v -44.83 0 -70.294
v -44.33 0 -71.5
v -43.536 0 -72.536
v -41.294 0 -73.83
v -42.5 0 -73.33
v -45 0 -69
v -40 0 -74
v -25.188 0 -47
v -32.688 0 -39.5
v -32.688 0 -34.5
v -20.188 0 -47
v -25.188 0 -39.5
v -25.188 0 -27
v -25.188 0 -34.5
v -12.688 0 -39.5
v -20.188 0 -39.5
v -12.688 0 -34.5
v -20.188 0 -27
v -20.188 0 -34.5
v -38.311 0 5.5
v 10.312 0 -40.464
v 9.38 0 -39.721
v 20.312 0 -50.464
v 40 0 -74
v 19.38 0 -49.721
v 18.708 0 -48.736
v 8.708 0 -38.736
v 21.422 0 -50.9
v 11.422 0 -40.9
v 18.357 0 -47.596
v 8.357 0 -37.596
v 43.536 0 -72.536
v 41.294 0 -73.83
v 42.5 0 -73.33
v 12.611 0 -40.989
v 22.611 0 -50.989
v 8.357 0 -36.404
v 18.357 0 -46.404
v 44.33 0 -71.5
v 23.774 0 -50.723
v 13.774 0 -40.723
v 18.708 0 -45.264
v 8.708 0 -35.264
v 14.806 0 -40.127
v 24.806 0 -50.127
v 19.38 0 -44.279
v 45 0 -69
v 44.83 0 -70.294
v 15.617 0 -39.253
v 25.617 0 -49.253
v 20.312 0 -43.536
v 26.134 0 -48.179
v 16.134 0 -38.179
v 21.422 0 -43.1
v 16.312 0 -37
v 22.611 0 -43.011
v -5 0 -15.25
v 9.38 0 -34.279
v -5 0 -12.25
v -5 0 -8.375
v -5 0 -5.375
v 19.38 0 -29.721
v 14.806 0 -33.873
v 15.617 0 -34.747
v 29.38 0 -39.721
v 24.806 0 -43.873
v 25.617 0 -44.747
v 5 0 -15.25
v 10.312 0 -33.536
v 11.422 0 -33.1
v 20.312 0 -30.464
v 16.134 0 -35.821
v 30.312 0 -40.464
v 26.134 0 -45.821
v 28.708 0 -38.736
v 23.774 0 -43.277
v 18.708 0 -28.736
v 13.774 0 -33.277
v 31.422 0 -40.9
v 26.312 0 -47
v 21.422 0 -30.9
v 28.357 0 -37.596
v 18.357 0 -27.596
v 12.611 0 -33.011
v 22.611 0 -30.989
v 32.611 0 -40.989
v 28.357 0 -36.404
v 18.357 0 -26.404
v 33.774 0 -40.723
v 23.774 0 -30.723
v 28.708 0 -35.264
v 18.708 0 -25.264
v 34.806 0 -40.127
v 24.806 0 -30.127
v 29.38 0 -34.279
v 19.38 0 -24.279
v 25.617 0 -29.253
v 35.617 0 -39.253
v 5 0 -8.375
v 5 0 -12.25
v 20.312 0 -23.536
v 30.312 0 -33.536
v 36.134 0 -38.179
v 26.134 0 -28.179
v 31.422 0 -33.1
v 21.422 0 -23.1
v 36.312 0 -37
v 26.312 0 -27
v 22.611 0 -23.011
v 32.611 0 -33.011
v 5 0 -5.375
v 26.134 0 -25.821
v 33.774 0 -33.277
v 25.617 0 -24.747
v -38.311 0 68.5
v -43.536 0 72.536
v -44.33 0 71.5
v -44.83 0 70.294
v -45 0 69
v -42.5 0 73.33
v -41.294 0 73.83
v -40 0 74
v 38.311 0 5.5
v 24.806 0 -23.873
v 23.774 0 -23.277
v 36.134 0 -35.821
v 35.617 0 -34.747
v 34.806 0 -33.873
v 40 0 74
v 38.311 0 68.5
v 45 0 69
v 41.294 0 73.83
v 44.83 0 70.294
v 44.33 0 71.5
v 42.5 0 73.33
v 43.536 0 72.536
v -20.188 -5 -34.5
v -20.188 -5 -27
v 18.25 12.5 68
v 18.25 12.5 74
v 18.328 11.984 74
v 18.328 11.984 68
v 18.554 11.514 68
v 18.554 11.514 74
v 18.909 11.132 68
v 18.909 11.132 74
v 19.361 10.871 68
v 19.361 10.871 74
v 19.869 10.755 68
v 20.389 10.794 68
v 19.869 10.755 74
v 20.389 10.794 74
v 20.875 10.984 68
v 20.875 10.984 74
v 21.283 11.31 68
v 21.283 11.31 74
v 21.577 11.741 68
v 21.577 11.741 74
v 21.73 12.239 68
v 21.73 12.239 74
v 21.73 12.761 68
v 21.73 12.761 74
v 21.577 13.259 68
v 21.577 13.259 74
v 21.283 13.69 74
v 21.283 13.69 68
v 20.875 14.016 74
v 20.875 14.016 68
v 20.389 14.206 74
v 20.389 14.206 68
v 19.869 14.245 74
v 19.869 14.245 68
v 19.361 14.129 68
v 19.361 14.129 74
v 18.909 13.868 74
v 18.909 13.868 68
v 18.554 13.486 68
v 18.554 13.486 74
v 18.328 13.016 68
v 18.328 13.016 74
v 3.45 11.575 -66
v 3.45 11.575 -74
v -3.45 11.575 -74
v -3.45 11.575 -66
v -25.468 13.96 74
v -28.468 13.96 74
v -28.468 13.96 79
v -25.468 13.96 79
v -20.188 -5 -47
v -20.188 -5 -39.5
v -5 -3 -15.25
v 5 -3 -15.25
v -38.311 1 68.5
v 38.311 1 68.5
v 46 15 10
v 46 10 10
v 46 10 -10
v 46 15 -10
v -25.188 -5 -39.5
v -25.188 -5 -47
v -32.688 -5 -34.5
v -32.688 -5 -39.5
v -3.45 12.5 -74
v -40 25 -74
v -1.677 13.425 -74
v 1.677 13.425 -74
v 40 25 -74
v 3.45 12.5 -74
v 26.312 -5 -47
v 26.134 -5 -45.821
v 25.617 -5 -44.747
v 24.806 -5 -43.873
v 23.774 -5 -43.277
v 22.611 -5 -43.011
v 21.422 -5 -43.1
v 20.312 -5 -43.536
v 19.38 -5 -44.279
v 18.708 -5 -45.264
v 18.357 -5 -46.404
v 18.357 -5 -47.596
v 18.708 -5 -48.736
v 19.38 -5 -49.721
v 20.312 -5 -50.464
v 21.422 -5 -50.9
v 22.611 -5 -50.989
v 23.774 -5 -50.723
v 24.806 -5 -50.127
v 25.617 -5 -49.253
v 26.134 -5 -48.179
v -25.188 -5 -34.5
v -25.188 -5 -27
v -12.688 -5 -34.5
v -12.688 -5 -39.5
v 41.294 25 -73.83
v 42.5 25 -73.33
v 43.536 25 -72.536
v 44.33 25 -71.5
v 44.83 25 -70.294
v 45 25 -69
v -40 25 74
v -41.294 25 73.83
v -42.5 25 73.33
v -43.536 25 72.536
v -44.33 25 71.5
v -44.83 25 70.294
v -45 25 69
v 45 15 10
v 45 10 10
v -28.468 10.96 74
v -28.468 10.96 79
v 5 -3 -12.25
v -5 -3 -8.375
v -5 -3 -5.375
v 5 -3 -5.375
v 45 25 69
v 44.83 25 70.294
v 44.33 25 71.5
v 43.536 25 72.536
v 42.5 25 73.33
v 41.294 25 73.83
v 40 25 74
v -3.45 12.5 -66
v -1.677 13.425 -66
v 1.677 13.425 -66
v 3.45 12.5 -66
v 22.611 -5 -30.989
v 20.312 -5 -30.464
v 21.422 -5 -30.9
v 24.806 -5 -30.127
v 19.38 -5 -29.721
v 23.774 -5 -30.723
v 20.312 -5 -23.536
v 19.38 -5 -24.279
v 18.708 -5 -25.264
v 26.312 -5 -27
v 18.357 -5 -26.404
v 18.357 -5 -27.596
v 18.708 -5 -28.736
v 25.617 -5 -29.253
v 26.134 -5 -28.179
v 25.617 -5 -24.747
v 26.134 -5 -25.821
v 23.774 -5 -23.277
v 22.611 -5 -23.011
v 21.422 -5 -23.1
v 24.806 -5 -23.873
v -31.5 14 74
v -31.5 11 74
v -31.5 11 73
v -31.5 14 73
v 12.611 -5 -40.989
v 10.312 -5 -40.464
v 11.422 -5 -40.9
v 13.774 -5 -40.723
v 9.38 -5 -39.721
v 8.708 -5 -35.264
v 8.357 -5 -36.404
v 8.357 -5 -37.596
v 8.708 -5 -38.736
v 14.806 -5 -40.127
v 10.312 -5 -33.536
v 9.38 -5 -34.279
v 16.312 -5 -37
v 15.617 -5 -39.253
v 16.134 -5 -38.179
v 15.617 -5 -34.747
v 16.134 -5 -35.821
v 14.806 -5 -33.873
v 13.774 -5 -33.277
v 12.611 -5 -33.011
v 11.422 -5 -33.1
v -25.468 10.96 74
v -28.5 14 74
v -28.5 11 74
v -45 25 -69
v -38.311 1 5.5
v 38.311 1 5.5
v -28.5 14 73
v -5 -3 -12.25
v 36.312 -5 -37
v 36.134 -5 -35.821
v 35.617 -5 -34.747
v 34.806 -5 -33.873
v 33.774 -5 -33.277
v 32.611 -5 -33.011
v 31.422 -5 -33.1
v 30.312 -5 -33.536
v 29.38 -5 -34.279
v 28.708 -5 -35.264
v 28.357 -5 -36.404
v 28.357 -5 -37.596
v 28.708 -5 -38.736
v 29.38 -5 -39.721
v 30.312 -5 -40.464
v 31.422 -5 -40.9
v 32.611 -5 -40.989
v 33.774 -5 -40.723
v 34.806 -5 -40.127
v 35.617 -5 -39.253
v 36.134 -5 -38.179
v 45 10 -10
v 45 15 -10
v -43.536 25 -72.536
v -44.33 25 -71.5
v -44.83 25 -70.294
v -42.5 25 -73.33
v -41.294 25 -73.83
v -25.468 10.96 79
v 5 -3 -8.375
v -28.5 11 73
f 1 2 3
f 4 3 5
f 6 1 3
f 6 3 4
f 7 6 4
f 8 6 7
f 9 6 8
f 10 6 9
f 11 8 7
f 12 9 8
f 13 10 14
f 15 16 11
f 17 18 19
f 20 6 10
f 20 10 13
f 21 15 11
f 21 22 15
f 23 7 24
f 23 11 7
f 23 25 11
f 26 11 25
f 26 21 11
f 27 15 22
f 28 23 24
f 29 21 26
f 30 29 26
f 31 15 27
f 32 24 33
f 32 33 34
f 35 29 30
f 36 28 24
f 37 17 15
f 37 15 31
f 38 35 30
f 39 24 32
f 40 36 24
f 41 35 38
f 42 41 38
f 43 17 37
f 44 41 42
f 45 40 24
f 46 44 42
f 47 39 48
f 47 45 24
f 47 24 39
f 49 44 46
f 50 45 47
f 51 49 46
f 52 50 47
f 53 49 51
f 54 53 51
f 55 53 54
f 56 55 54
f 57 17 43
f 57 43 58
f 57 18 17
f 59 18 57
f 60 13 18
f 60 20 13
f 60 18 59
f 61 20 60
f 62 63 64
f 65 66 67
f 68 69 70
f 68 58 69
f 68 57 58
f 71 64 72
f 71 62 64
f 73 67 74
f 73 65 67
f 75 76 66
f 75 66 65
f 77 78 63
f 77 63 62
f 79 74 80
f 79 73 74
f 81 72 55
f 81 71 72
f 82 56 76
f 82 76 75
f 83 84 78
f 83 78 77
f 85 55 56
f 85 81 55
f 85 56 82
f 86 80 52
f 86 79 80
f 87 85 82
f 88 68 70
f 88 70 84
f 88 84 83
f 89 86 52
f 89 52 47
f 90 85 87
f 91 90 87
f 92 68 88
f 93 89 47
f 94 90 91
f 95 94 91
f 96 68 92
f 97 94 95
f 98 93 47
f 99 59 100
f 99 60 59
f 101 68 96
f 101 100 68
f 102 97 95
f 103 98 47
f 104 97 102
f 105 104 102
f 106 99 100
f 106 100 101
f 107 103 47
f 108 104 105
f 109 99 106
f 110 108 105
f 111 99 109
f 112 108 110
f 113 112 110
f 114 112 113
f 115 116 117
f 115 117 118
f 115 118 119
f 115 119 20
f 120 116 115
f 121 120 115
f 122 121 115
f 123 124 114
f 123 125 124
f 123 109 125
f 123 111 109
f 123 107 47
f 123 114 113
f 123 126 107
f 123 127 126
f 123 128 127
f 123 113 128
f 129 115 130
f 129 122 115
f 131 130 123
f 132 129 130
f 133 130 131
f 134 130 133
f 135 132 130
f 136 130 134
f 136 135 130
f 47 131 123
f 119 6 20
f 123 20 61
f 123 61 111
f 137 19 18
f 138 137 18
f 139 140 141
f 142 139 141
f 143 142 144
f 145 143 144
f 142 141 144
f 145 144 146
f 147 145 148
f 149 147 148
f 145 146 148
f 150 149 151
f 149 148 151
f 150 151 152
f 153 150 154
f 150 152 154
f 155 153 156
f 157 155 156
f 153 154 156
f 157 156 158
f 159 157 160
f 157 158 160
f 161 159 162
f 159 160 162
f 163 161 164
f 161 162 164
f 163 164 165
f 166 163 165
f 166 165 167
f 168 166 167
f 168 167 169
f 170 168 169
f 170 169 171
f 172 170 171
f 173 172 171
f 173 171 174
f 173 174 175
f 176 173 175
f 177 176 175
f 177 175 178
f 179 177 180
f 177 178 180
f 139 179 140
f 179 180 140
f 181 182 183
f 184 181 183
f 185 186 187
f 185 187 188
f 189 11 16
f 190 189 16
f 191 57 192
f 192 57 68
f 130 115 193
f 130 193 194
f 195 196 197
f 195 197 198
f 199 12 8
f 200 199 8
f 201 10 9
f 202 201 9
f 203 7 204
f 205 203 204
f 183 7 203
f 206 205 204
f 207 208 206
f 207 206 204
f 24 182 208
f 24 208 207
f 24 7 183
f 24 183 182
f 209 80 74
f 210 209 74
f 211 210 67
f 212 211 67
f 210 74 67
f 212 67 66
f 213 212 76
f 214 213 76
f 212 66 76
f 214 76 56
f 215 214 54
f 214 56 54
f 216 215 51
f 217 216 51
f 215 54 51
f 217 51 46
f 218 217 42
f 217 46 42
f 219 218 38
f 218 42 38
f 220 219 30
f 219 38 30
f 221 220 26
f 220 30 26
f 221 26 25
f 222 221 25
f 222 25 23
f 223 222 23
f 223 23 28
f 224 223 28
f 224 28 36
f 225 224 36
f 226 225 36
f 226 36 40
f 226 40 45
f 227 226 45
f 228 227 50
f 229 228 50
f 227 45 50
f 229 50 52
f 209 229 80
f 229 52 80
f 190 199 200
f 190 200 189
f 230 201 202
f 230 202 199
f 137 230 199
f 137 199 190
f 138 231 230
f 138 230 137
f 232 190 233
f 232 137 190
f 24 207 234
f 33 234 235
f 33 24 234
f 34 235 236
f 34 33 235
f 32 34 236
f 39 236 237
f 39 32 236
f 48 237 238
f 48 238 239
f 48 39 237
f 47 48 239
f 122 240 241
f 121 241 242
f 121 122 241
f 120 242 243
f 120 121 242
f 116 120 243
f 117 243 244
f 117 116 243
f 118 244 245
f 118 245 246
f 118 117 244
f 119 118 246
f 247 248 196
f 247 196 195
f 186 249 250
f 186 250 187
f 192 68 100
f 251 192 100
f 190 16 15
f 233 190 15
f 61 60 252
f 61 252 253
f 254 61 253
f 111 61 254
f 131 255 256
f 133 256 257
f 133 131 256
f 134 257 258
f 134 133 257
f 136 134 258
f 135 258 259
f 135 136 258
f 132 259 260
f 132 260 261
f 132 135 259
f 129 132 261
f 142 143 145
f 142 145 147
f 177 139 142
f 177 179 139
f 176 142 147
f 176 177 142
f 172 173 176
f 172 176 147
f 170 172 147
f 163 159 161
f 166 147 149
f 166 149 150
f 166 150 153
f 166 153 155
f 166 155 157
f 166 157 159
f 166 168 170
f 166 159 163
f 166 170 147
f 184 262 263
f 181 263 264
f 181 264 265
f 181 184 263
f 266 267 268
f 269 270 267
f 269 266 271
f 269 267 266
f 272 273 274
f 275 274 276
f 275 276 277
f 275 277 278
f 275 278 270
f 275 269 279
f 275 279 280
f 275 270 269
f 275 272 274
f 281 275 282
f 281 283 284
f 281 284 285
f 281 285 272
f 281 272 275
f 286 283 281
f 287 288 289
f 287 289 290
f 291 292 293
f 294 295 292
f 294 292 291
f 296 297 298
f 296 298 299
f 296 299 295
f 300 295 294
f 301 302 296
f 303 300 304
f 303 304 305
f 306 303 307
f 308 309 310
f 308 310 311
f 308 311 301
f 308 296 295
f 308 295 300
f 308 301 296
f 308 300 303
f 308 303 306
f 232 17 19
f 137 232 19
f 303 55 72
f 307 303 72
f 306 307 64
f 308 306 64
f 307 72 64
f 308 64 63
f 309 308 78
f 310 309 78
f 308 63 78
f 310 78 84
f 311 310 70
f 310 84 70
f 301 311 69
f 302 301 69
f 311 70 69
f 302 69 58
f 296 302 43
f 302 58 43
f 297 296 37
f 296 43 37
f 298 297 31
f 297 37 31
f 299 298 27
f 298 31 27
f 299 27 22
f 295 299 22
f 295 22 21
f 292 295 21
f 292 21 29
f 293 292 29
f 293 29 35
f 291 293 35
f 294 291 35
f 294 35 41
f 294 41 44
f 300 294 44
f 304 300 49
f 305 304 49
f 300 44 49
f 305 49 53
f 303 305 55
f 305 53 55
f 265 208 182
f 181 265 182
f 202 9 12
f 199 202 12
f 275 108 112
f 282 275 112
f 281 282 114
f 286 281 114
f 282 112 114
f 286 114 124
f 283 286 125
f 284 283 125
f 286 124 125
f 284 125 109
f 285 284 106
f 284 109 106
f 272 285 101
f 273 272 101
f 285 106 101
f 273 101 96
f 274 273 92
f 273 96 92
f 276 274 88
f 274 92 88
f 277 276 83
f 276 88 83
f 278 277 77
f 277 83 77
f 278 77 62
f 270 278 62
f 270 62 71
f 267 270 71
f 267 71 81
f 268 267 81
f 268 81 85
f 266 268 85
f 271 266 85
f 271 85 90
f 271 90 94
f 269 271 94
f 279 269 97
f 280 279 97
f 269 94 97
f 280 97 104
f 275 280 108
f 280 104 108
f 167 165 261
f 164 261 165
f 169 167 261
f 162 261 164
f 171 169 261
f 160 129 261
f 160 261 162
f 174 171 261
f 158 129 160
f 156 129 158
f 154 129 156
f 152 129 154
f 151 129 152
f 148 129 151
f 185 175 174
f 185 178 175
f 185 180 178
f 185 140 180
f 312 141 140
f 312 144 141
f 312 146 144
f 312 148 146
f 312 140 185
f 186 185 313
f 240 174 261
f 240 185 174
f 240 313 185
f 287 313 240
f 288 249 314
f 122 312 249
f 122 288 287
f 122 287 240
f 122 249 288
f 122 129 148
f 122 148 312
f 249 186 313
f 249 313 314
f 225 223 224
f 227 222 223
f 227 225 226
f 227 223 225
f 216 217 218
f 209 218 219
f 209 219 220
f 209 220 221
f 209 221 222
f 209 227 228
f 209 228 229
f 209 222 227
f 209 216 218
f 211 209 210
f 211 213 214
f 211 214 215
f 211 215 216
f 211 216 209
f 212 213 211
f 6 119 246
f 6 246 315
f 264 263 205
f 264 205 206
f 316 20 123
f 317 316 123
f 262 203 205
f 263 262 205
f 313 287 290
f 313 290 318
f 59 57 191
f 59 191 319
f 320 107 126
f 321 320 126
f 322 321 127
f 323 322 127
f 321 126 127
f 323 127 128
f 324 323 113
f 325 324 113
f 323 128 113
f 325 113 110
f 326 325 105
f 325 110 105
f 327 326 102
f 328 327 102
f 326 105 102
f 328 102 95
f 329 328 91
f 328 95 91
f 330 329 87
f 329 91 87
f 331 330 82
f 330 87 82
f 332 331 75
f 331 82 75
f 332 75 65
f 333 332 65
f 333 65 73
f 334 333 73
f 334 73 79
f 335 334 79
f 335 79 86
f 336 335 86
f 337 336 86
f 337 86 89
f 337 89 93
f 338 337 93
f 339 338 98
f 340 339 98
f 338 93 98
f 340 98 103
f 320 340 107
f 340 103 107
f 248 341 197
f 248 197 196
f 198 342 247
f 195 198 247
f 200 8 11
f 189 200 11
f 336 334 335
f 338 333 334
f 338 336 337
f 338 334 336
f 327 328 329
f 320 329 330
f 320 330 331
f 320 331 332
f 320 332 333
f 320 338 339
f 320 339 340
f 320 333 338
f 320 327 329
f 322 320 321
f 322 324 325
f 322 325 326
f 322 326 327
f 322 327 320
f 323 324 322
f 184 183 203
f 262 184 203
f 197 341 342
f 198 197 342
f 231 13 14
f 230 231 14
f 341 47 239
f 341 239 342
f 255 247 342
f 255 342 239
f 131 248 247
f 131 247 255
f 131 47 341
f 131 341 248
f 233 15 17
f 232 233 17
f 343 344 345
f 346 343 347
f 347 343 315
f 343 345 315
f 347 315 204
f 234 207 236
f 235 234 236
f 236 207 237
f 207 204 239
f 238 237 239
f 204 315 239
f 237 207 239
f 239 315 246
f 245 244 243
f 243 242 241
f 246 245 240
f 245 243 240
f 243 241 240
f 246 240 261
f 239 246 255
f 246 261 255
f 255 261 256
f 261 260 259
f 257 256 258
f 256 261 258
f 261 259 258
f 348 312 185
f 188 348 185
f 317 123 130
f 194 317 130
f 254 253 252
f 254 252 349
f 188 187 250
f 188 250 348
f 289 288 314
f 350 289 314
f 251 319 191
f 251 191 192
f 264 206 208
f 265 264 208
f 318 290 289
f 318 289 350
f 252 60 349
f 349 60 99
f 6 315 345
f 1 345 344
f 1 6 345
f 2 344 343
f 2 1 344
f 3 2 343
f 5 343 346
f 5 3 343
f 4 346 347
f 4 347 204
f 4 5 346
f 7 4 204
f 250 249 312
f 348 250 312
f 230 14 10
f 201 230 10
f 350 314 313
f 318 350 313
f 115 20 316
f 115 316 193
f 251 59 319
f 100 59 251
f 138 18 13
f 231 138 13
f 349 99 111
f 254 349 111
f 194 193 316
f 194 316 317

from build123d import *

# Parameters (mm, degrees)
F1_DEPTH  = 25
F2_W      = 5
F2_H      = 20
F3_DEPTH  = 1
F4_W      = 76.621622
F4_H      = 63
F5_DEPTH  = 1
F7_DEPTH  = 8
F10_DEPTH = 6
F11_R     = 4
F12_DEPTH = 5
F13_W     = 10
F13_H     = 3
F14_DEPTH = 3
F15_W     = 3
F15_H     = 3
F16_DEPTH = 1
F17_W     = 3
F17_H     = 3
F18_DEPTH = 5


with BuildPart() as f1:
    # F0 (on Front) → F1 (new body)
    with BuildSketch(Plane.XZ):
        with BuildLine():
            Line((-40, -74), (40, -74))
            ThreePointArc((40, -74), (43.535534, -72.535534), (45, -69))
            Line((45, -69), (45, 69))
            ThreePointArc((45, 69), (43.535534, 72.535534), (40, 74))
            Line((40, 74), (-40, 74))
            ThreePointArc((-40, 74), (-43.535534, 72.535534), (-45, 69))
            Line((-45, 69), (-45, -69))
            ThreePointArc((-45, -69), (-43.535534, -72.535534), (-40, -74))
        make_face()
    extrude(amount=-F1_DEPTH)

    # F2 (on face) → F3 (join)
    with BuildSketch(Plane.YZ.offset(45)):
        with Locations((12.5, 0)):
            Rectangle(F2_W, F2_H)
    extrude(amount=F3_DEPTH)

    # F4 (on face) → F5 (cut)
    with BuildSketch(Plane.XZ):
        with Locations((0, 37)):
            Rectangle(F4_W, F4_H)
    extrude(amount=-F5_DEPTH, mode=Mode.SUBTRACT)

    # F6 (on face) → F7 (cut)
    with BuildSketch(Plane(origin=(0, 0, -74), x_dir=(1, 0, 0), z_dir=(0, 0, -1))):
        Polygon((3.45, -11.575), (0, -11.575), (-3.45, -11.575), (-3.45, -12.5), (-1.676761, -13.425), (1.676761, -13.425), (3.45, -12.5), align=None)
    extrude(amount=-F7_DEPTH, mode=Mode.SUBTRACT)

    # F9 (on face) → F10 (cut)
    with BuildSketch(Plane.XY.offset(74)):
        with BuildLine():
            ThreePointArc((21.75, 12.5), (20, 14.25), (18.25, 12.5))
            Line((18.25, 12.5), (21.75, 12.5))
        make_face()
        with BuildLine():
            Line((21.75, 12.5), (18.25, 12.5))
            ThreePointArc((18.25, 12.5), (20, 10.75), (21.75, 12.5))
        make_face()
    extrude(amount=-F10_DEPTH, mode=Mode.SUBTRACT)

    # F11 (on Front) → F12 (join)
    with BuildSketch(Plane.XZ):
        Polygon((-20.187831, -27), (-22.687831, -27), (-25.187831, -27), (-25.187831, -34.5), (-32.687831, -34.5), (-32.687831, -37), (-32.687831, -39.5), (-25.187831, -39.5), (-25.187831, -47), (-22.687831, -47), (-20.187831, -47), (-20.187831, -39.5), (-12.687831, -39.5), (-12.687831, -37), (-12.687831, -34.5), (-20.187831, -34.5), align=None)
        with Locations((32.312169, -37)):
            Circle(F11_R)
        with Locations((22.312169, -47)):
            Circle(F11_R)
        with Locations((12.312169, -37)):
            Circle(F11_R)
        with Locations((22.312169, -27)):
            Circle(F11_R)
    extrude(amount=F12_DEPTH)

    # F13 (on face) → F14 (join)
    with BuildSketch(Plane.XZ):
        with Locations((0, -6.875)):
            Rectangle(F13_W, F13_H)
        with Locations((0, -13.75)):
            Rectangle(F13_W, F13_H)
    extrude(amount=F14_DEPTH)

    # F15 (on face) → F16 (cut)
    with BuildSketch(Plane.XY.offset(74)):
        with Locations((-30, 12.5)):
            Rectangle(F15_W, F15_H)
    extrude(amount=-F16_DEPTH, mode=Mode.SUBTRACT)

    # F17 (on face) → F18 (join)
    with BuildSketch(Plane.XY.offset(74)):
        with Locations((-26.967838, 12.45954)):
            Rectangle(F17_W, F17_H)
    extrude(amount=F18_DEPTH)


solid = f1.part
